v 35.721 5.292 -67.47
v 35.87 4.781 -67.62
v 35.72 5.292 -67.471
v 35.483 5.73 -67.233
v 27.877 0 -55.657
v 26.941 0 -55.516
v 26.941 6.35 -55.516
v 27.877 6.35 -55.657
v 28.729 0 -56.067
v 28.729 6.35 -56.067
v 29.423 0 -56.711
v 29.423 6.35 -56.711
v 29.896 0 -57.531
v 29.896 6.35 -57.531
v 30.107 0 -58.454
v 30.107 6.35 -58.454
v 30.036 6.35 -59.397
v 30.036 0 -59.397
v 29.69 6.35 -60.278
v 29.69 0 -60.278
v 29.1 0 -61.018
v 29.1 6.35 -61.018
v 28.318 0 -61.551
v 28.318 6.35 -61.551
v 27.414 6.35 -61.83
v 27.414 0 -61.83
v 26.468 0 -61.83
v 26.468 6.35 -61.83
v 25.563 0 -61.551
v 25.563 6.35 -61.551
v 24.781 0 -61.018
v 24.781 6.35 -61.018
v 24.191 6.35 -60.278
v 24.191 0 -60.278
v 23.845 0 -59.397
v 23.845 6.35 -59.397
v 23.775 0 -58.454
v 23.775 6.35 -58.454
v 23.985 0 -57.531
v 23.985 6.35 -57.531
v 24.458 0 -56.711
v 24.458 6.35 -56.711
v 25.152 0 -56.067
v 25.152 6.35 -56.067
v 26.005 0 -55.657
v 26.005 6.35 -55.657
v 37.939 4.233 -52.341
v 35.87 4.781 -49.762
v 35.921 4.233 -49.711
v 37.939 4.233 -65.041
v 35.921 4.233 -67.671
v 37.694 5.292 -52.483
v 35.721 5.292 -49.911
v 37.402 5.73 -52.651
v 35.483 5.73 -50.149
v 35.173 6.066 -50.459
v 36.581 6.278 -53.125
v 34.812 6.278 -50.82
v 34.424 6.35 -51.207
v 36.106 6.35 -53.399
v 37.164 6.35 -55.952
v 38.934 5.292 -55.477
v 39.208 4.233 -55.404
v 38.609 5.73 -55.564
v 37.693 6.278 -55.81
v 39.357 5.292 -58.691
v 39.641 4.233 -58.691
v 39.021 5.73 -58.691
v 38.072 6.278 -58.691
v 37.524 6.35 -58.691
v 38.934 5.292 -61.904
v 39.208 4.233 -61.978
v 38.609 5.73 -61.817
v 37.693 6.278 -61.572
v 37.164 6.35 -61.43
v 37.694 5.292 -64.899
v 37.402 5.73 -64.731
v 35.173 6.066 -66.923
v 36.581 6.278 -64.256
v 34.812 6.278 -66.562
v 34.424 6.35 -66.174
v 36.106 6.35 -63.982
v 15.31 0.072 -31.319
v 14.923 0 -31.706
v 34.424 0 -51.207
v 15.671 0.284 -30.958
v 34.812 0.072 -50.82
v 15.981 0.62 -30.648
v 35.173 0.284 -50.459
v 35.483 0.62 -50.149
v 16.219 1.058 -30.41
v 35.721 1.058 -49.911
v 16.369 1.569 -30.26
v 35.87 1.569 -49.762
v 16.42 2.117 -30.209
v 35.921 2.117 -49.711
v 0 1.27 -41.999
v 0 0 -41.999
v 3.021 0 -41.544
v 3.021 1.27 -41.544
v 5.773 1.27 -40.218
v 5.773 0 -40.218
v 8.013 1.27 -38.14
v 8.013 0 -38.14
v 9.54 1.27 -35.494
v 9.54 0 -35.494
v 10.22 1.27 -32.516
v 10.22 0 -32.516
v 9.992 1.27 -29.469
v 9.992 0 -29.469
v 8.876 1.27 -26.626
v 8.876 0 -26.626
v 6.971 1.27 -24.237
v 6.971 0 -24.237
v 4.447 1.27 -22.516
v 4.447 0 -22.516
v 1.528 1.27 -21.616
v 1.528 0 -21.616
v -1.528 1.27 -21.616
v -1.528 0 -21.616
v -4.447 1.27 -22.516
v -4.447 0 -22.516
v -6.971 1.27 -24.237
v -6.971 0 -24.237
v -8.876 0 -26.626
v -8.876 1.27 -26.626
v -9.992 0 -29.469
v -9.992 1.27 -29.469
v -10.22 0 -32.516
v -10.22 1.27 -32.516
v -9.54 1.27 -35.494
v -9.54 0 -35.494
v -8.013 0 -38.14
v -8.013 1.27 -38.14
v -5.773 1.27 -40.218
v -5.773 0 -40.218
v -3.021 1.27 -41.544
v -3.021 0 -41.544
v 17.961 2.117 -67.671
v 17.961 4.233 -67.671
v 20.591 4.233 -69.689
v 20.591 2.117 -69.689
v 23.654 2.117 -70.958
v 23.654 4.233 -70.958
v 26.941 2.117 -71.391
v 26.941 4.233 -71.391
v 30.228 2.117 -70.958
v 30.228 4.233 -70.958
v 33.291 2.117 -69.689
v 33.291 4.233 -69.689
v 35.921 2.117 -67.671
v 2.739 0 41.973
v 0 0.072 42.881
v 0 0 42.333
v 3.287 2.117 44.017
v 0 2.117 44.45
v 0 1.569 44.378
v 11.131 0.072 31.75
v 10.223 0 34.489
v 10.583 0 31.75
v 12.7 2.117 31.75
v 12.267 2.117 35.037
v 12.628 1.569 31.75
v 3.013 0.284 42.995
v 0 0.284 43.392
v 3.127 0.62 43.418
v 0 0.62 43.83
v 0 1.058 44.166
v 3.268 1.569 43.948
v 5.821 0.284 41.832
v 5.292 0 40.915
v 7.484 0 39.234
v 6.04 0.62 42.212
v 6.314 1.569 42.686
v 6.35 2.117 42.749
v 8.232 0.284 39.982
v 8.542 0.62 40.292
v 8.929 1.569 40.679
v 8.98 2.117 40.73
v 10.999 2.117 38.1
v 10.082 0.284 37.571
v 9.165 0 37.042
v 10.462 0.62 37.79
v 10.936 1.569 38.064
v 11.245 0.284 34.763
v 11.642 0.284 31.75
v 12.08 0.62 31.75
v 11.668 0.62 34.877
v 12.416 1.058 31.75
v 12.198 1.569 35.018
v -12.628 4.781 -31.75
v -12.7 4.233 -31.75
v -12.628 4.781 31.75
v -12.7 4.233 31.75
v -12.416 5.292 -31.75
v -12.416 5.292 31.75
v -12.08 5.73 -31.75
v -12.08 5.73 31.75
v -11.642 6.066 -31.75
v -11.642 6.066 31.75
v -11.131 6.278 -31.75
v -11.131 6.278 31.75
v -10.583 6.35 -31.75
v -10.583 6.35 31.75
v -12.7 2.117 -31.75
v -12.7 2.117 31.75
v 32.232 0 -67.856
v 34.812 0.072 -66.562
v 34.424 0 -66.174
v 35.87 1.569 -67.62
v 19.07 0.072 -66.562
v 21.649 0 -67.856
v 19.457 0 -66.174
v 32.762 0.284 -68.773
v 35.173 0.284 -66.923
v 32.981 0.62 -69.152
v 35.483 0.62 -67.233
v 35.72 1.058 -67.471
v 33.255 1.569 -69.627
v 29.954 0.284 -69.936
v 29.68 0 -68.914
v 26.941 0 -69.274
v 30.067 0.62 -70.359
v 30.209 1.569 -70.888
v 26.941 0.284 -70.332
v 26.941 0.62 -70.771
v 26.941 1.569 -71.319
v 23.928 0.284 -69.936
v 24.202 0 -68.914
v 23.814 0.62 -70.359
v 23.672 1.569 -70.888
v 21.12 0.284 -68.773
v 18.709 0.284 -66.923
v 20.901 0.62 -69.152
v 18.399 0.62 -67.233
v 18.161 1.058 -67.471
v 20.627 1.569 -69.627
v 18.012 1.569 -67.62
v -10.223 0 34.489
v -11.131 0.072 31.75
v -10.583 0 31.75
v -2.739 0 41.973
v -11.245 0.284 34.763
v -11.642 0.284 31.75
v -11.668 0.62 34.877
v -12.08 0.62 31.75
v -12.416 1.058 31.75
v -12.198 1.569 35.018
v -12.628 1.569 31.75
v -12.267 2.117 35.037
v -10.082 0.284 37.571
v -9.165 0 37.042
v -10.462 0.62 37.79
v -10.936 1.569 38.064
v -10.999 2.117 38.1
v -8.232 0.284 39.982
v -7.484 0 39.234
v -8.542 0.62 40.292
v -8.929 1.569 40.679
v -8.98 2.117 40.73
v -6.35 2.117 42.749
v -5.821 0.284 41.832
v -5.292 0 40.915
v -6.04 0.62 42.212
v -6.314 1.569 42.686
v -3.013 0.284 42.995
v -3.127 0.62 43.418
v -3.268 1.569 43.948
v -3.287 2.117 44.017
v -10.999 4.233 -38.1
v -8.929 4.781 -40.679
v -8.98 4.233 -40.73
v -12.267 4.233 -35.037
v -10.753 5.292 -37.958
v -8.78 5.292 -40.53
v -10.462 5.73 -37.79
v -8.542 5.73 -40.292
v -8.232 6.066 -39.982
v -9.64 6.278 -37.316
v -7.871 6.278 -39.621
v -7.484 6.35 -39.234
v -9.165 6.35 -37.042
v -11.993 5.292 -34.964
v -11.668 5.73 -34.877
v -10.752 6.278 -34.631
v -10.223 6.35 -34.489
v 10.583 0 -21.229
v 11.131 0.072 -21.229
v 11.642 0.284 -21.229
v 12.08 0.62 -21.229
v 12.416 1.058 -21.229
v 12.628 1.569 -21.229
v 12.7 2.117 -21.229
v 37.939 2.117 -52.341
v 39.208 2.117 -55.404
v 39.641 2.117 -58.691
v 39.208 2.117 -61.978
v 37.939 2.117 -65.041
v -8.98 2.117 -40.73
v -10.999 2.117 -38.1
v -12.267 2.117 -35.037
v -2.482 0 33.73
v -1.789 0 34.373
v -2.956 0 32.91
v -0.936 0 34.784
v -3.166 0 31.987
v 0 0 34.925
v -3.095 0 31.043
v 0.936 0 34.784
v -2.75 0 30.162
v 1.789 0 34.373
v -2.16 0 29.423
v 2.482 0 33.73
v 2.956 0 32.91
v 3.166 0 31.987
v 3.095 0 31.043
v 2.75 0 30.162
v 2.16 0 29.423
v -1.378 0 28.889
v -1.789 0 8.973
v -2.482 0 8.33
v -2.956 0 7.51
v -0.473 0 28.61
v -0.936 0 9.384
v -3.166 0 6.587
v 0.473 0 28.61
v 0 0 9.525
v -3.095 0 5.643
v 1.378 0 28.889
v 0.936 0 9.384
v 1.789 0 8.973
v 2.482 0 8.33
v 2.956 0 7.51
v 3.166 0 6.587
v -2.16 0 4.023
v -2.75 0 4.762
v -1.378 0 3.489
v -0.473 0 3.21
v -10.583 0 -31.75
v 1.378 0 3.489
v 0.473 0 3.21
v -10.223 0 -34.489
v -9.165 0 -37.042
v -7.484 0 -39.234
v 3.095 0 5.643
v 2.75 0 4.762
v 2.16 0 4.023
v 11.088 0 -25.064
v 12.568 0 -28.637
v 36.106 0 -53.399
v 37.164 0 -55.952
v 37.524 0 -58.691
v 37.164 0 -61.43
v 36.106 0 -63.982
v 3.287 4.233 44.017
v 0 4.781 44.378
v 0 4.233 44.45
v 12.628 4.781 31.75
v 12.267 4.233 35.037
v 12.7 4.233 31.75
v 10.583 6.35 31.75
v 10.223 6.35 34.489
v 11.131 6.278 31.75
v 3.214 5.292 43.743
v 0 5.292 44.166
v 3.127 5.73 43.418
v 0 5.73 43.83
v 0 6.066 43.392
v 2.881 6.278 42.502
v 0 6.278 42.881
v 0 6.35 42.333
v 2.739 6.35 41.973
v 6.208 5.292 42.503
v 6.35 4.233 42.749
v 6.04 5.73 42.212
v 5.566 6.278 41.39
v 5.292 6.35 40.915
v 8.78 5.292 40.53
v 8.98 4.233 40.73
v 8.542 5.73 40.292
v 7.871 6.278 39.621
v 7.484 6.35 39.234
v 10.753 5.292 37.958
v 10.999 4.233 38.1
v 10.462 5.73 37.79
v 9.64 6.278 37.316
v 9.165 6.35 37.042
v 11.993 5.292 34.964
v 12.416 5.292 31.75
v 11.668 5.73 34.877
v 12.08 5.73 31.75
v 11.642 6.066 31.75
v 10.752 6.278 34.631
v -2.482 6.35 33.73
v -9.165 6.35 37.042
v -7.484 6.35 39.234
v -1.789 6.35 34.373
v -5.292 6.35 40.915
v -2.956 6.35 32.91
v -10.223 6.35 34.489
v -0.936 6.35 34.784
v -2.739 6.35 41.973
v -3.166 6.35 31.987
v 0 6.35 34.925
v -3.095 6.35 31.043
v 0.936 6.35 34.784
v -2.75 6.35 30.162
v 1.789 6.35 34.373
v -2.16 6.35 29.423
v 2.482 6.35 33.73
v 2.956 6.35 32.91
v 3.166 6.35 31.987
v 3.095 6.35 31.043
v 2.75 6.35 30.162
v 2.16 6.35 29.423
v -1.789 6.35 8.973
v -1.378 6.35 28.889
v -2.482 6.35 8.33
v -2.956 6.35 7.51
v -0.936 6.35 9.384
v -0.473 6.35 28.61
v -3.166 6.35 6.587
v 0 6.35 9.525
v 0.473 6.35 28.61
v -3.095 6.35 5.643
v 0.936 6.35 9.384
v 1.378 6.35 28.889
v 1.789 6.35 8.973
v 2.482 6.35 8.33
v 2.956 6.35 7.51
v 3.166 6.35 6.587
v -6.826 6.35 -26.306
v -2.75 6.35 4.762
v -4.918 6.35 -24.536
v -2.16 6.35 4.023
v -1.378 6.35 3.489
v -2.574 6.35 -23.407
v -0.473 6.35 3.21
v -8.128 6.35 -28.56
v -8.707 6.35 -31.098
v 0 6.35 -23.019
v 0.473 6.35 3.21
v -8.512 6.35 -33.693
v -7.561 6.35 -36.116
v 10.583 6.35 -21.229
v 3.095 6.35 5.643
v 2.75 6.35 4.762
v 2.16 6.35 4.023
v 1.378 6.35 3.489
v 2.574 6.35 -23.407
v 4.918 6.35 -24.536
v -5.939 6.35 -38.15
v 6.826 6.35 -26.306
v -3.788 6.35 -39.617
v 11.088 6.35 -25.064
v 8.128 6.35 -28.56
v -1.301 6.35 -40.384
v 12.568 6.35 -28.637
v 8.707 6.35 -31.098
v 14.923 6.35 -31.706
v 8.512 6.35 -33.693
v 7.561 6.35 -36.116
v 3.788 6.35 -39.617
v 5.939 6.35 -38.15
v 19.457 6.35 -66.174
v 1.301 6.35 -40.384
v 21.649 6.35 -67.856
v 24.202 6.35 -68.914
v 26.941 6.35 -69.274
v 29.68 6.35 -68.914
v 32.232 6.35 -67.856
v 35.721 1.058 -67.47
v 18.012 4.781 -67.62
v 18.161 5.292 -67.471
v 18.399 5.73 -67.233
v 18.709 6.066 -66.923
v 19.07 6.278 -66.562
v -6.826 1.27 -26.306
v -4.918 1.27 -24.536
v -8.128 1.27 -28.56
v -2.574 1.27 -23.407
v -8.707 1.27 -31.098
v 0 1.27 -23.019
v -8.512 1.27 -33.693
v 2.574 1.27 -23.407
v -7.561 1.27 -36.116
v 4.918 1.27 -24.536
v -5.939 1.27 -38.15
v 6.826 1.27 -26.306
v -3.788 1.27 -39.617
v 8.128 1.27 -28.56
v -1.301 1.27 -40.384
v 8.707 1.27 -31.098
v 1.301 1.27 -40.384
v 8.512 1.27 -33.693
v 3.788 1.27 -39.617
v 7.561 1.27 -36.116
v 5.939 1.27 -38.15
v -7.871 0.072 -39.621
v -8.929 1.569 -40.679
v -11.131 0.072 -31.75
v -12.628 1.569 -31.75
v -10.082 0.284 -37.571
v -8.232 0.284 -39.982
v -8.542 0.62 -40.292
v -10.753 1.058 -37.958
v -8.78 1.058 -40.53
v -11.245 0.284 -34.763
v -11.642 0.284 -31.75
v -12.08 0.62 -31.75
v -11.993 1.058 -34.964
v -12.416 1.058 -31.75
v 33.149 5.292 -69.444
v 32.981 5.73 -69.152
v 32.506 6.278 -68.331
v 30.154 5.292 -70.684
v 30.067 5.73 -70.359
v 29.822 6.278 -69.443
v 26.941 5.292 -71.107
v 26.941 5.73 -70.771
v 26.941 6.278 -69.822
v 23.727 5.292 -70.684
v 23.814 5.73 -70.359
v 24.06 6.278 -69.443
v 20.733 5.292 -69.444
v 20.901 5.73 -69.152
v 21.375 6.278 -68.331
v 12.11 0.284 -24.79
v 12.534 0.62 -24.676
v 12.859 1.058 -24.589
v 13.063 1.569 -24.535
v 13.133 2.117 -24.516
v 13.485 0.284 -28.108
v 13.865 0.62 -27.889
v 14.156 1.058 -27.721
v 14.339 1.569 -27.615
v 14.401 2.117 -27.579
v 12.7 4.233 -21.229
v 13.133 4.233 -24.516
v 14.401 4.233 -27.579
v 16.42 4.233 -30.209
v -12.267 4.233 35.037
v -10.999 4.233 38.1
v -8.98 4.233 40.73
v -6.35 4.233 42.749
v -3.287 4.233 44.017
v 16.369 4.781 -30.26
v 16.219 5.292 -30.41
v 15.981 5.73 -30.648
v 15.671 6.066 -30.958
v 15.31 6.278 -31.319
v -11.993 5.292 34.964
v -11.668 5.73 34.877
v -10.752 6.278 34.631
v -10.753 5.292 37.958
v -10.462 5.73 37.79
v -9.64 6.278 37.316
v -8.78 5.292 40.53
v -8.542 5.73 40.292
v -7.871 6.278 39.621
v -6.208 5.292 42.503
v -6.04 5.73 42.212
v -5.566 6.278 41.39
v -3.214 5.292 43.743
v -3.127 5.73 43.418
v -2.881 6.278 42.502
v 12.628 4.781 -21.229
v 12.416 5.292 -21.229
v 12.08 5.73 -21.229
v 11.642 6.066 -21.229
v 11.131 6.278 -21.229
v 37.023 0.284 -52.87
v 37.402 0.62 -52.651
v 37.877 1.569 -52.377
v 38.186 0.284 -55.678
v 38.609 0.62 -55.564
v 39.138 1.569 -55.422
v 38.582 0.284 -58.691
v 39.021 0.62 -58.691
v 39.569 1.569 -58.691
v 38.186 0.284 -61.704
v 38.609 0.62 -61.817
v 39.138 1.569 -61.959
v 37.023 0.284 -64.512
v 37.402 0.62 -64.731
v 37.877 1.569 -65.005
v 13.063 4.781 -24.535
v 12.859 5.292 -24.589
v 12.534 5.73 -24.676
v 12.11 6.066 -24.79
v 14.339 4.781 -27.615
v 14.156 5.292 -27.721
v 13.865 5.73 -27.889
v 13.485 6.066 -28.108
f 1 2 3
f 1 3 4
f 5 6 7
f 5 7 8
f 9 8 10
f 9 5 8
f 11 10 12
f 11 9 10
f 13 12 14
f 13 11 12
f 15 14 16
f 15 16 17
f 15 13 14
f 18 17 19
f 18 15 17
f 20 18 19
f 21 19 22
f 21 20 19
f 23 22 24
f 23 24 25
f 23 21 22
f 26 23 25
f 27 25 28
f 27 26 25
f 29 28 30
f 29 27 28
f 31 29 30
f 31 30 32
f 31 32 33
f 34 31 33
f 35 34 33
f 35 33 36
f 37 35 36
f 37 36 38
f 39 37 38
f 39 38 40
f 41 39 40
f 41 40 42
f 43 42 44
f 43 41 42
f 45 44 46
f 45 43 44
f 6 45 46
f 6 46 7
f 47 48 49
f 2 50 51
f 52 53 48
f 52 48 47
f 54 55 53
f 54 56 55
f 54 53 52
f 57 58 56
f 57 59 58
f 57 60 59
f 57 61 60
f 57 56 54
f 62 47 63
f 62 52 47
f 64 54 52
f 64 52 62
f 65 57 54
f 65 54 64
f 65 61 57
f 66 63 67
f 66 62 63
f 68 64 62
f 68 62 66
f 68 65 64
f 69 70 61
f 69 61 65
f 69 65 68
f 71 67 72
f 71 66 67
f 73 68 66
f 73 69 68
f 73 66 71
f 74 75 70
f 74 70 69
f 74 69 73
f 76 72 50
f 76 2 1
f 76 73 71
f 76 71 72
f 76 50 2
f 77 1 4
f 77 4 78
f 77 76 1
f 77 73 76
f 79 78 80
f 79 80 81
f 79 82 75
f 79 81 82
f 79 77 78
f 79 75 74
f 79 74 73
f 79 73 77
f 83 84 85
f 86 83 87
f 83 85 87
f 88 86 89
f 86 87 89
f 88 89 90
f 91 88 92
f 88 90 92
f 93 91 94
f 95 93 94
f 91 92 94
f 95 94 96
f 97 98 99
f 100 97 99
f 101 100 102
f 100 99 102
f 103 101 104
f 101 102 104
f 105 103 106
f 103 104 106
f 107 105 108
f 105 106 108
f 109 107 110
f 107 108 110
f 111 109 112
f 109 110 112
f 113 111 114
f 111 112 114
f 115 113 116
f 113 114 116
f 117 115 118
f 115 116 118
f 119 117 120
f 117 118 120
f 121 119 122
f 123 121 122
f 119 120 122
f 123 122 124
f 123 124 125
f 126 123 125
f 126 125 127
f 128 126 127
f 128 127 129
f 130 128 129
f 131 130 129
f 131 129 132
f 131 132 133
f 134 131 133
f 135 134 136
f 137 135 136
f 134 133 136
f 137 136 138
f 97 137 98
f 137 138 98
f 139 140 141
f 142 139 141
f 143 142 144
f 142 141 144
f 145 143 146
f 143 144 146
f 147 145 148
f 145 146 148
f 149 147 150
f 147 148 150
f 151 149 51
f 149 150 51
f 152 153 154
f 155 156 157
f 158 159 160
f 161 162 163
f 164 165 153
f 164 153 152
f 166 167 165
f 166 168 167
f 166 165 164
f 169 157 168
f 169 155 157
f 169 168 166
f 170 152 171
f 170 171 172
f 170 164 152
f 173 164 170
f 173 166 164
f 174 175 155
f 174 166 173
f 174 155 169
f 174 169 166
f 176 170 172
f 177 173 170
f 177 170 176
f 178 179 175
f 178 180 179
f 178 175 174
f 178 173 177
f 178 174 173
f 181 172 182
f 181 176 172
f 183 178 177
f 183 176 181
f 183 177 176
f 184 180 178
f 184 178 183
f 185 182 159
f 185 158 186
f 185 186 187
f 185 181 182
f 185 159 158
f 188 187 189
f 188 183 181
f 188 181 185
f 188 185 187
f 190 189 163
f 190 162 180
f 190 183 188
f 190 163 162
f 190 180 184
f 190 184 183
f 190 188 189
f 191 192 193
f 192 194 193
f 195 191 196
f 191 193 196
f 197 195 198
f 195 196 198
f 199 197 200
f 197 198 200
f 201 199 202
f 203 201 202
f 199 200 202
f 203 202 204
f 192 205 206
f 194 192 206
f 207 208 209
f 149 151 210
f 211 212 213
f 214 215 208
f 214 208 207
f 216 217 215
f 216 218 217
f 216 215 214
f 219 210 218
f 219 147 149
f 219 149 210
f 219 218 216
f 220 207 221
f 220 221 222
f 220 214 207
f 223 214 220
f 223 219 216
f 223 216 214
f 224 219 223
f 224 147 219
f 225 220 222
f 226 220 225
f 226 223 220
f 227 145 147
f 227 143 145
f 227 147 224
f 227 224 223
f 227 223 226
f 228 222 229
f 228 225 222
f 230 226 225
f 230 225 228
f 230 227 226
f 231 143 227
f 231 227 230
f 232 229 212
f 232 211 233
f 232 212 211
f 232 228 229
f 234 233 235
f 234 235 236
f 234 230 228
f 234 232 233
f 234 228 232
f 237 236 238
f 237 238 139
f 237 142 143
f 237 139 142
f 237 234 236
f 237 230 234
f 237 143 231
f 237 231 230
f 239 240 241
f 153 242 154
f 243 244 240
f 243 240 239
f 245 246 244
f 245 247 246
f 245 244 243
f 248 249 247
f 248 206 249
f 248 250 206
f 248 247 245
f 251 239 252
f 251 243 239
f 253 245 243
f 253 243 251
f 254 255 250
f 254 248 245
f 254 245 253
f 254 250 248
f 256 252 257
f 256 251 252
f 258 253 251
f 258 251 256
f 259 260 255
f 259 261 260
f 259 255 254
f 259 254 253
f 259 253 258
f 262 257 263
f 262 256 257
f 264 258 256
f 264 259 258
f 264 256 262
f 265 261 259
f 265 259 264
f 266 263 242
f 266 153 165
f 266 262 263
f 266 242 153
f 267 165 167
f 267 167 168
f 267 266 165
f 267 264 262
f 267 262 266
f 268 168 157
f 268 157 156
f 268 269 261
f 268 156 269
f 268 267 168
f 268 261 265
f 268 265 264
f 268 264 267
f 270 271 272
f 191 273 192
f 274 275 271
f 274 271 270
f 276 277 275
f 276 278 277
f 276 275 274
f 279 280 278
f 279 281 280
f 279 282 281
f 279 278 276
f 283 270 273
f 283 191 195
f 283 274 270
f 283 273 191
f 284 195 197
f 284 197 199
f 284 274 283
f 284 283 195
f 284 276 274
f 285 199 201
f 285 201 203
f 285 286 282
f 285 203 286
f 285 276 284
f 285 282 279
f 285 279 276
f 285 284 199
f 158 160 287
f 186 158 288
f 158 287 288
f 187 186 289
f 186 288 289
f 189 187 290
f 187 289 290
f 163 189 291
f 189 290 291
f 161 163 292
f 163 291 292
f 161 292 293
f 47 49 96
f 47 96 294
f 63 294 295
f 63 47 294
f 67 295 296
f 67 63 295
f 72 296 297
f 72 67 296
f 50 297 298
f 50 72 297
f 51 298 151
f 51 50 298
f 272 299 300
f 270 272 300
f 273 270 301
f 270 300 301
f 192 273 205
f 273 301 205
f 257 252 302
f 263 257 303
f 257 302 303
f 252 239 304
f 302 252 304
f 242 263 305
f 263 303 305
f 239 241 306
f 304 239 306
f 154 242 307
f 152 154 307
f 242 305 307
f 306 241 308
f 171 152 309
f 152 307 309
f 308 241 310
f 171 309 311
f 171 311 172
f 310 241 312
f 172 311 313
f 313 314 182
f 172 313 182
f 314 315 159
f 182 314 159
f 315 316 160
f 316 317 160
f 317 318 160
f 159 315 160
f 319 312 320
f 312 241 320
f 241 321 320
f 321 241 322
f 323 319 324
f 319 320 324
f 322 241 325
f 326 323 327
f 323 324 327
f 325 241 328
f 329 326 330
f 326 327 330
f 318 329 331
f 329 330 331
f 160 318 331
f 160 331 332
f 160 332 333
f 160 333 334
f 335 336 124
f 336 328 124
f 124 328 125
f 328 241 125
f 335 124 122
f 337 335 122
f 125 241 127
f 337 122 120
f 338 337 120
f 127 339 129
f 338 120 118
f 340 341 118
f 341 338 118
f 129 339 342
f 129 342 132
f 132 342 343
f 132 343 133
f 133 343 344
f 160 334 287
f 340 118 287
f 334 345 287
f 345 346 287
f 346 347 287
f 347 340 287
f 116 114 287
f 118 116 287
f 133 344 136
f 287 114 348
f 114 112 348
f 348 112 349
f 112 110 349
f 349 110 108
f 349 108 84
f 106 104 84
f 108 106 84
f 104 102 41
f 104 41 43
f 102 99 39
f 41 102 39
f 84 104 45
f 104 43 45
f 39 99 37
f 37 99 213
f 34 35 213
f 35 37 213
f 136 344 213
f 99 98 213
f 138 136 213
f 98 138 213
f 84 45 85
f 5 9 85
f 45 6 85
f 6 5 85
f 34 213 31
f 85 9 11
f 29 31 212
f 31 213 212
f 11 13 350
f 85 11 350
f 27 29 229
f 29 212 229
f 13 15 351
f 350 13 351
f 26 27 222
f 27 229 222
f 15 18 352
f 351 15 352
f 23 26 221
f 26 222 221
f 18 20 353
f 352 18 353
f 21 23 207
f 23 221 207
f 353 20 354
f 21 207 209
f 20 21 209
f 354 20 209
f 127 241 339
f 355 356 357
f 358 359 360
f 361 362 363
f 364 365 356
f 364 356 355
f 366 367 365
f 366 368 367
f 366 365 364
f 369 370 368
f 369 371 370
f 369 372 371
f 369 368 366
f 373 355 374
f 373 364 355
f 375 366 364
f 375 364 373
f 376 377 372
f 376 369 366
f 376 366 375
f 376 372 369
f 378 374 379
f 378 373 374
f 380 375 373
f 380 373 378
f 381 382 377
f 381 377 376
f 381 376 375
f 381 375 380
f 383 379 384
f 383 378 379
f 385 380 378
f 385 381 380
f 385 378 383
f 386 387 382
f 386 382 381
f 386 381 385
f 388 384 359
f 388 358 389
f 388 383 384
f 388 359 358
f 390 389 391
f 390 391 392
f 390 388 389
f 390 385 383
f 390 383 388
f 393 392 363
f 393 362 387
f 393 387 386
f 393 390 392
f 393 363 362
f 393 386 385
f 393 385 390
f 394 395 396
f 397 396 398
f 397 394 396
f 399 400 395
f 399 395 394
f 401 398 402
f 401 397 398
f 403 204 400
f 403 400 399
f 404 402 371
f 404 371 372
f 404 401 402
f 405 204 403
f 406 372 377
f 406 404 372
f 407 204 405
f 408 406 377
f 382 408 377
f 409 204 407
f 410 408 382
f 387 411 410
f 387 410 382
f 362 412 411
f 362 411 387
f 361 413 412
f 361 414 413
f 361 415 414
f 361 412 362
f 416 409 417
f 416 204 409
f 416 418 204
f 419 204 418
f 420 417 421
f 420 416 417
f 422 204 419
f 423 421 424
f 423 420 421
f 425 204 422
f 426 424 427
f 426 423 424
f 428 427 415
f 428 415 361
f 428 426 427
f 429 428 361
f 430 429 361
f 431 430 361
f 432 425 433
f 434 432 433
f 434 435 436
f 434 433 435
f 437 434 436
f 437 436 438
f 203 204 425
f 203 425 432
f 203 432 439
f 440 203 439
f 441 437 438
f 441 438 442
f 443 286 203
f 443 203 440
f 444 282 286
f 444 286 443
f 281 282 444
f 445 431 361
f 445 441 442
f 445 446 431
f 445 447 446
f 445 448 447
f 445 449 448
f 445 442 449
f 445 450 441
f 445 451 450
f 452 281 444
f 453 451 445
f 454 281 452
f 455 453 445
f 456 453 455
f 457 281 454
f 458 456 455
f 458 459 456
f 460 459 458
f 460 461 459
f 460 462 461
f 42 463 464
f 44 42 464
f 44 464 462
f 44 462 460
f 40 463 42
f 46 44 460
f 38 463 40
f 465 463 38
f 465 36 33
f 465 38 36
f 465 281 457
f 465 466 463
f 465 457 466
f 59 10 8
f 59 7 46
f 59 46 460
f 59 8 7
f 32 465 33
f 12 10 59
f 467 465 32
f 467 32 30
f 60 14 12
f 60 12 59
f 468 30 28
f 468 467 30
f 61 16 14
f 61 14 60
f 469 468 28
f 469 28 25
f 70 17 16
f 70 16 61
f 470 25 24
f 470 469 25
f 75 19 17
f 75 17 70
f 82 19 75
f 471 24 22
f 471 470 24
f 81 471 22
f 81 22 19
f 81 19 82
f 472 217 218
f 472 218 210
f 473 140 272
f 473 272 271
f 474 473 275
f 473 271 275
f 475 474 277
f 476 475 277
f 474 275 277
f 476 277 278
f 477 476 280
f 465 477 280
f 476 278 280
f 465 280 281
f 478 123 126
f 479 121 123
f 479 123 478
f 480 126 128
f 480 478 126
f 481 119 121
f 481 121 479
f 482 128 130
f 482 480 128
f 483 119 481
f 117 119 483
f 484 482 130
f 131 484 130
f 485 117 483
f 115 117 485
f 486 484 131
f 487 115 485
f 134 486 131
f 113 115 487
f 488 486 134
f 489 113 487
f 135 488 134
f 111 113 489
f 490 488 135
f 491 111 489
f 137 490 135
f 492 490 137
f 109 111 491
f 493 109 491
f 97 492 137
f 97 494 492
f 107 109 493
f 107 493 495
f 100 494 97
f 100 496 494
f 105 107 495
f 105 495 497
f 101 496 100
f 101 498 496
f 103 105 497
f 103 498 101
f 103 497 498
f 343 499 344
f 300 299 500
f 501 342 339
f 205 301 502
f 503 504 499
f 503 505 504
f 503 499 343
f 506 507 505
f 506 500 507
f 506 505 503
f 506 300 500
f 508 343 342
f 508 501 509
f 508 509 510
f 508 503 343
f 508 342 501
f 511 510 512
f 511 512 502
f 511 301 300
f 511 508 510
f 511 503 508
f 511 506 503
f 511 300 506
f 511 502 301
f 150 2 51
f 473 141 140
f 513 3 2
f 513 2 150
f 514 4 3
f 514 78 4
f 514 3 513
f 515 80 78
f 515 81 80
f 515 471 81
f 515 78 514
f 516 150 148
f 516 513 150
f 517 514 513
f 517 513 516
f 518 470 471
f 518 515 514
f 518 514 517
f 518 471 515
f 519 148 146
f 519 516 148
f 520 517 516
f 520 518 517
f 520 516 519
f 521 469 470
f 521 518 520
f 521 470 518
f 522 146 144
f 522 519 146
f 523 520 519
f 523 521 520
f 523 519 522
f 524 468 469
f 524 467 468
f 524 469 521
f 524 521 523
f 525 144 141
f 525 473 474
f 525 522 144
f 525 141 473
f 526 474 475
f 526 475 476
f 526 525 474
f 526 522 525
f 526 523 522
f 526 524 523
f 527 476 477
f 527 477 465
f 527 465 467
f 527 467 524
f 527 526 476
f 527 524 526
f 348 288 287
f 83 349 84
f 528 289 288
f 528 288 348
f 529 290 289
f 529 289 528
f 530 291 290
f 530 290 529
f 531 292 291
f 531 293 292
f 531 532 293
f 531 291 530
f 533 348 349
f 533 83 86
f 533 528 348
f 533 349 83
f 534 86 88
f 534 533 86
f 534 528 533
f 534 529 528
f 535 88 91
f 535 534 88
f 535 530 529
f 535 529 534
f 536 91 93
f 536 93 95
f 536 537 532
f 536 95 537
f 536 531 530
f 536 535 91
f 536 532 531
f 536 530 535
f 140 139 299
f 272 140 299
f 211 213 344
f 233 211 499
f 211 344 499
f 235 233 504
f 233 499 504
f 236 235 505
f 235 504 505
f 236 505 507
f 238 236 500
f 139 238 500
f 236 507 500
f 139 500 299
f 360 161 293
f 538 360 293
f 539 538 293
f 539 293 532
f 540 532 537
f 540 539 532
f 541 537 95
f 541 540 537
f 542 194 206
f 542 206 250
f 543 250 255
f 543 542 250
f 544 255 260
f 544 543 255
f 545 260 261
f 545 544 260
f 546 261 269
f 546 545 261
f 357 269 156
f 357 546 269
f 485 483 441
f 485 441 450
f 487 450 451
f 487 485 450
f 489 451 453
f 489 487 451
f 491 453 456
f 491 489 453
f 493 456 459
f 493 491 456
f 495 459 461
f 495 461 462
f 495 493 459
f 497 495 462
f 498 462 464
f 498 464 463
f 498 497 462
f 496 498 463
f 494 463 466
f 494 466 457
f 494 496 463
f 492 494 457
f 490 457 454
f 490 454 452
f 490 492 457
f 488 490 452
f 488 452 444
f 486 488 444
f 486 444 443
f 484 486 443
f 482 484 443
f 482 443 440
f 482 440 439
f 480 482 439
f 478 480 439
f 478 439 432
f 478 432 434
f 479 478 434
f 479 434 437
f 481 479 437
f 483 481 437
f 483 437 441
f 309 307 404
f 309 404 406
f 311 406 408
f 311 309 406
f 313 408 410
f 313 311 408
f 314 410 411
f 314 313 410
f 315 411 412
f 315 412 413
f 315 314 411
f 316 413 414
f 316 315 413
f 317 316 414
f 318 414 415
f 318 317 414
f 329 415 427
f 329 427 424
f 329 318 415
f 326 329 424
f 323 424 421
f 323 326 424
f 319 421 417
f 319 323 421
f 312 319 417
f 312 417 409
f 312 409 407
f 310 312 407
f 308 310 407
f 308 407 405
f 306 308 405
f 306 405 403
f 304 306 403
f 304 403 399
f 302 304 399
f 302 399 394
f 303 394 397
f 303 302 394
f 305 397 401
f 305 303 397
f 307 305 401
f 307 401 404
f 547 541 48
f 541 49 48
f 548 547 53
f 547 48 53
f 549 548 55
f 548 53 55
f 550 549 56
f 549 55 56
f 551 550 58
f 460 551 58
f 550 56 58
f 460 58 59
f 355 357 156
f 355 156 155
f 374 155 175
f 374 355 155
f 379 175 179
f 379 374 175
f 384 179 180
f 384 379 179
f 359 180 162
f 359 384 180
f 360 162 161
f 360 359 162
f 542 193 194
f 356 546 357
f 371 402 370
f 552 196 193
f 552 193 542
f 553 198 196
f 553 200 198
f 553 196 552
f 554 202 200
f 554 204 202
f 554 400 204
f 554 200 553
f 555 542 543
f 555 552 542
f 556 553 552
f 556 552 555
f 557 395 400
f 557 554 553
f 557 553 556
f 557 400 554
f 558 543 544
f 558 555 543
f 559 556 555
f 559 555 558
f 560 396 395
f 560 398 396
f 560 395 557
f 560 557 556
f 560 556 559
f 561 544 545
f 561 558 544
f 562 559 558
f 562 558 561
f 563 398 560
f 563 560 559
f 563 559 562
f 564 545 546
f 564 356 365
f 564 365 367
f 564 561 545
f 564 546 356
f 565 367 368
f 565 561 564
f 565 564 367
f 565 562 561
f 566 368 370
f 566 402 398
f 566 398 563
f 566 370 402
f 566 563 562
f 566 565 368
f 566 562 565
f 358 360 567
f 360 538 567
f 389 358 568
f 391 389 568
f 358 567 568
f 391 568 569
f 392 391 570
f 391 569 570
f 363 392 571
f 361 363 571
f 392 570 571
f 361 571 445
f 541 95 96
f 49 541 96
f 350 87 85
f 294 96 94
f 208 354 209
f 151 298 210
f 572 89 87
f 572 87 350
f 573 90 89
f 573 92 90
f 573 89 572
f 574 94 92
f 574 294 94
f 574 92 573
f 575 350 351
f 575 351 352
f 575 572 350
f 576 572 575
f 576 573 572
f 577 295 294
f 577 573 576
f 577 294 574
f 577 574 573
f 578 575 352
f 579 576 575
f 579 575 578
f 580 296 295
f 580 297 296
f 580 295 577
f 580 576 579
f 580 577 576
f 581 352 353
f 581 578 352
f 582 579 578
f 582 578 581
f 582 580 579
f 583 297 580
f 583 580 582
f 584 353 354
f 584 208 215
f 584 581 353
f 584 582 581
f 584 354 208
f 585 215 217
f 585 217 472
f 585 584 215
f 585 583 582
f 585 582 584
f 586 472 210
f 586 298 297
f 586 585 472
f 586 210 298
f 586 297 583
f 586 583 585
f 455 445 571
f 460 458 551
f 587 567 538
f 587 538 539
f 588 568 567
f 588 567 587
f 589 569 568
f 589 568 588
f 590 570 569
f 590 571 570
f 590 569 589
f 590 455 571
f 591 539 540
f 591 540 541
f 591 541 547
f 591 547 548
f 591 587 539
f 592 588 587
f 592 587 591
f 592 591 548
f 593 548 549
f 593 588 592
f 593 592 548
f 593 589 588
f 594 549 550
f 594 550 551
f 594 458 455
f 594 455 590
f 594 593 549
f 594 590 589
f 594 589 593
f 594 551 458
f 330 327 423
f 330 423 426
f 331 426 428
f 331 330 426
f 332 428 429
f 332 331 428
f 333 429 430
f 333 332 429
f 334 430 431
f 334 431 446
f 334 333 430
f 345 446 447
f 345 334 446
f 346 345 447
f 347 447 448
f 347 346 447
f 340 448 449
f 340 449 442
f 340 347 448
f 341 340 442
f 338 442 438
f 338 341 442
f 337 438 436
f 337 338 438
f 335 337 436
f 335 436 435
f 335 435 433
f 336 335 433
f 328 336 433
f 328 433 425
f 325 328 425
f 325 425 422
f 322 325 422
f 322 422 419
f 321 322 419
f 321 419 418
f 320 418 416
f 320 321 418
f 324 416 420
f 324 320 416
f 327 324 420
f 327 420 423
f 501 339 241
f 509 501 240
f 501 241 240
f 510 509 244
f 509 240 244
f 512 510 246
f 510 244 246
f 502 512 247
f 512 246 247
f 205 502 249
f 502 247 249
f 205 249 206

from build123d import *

# Parameters (mm, degrees)
SKETCH1_R           = 3.175
SKETCH1_R_2         = 12.7
SKETCH1_R_3         = 8.73125
BOSS_EXTRUDE1_DEPTH = 6.35
FILLET2_R           = 12.7
FILLET3_R           = 2.116666667
SKETCH3_R           = 10.2489
CUT_EXTRUDE1_DEPTH  = 1.27


with BuildPart() as part:
    # Sketch1 → Boss-Extrude1 (new body)
    # profile 1 of 4: a face of its own
    with BuildSketch(Plane(origin=(0, 0, 0), x_dir=(1, 0, 0), z_dir=(0, 1, 0))):
        with BuildLine():
            Line((-12.7, 31.75), (-12.7, -44.45))
            Line((-12.7, -44.45), (12.7, -44.45))
            Line((12.7, -44.45), (12.7, 26.489487758))
            Line((12.7, 26.489487758), (8.980256121, 22.769743879))
            ThreePointArc((8.980256121, 22.769743879), (-4.860079591, 20.016729937), (-12.7, 31.75))
        make_face()
        with Locations(Location((0, -31.75, 0), (0, 0, 270))):
            Circle(SKETCH1_R, mode=Mode.SUBTRACT)
        with Locations(Location((0, -6.35, 0), (0, 0, 270))):
            Circle(SKETCH1_R, mode=Mode.SUBTRACT)
    # profile 2 of 4: a face of its own
    with BuildSketch(Plane(origin=(0, 0, 0), x_dir=(1, 0, 0), z_dir=(0, 1, 0))):
        with Locations((0, 31.75)):
            Circle(SKETCH1_R_2)
        with Locations(Location((0, 31.75, 0), (0, 0, 270))):
            Circle(SKETCH1_R_3, mode=Mode.SUBTRACT)
    # profile 3 of 4: a face of its own
    with BuildSketch(Plane(origin=(0, 0, 0), x_dir=(1, 0, 0), z_dir=(0, 1, 0))):
        with BuildLine():
            Line((12.7, 31.75), (12.7, 26.489487758))
            Line((12.7, 26.489487758), (44.901280605, 58.690768363))
            Line((44.901280605, 58.690768363), (26.940768363, 76.651280605))
            Line((26.940768363, 76.651280605), (-8.980256121, 40.730256121))
            ThreePointArc((-8.980256121, 40.730256121), (4.860079591, 43.483270063), (12.7, 31.75))
        make_face()
        with Locations(Location((26.940768363, 58.690768363, 0), (0, 0, 270))):
            Circle(SKETCH1_R, mode=Mode.SUBTRACT)
    # profile 4 of 4: a face of its own
    with BuildSketch(Plane(origin=(0, 0, 0), x_dir=(1, 0, 0), z_dir=(0, 1, 0))):
        with BuildLine():
            Line((8.980256121, 22.769743879), (12.7, 26.489487758))
            Line((12.7, 26.489487758), (12.7, 31.75))
            ThreePointArc((12.7, 31.75), (11.733270063, 26.889920409), (8.980256121, 22.769743879))
        make_face()
    extrude(amount=BOSS_EXTRUDE1_DEPTH)

    # Fillet2
    fillet2_edges = [part.edges().sort_by_distance(p)[0] for p in [
        (12.7, 3.175, -26.489487758),
        (26.940768363, 3.175, -76.651280605),
        (44.901280605, 3.175, -58.690768363),
        (-12.7, 3.175, 44.45),
        (12.7, 3.175, 44.45),
    ]]
    fillet(fillet2_edges, radius=FILLET2_R - 0.0001)  # a hair under: the kernel refuses the full size

    # Fillet3
    fillet3_edges = [part.edges().sort_by_distance(p)[0] for p in [
        (-11.733270063, 6.35, -36.610079591),
        (-11.733270063, 0, -36.610079591),
        (26.170404892, 0, -39.95989265),
        (26.170404892, 6.35, -39.95989265),
        (12.7, 0, 5.260541531),
        (12.7, 6.35, 5.260541531),
        (4.490163416, 0, -54.200675658),
        (4.490163416, 6.35, -54.200675658),
        (-12.7, 0, 5e-05),
        (8.98028541, 0, 40.73028541),
        (-8.98028541, 0, 40.73028541),
        (39.640809785, 0, -58.690768363),
        (26.940768363, 0, -71.390809785),
        (-12.7, 6.35, 5e-05),
        (8.98028541, 6.35, 40.73028541),
        (-8.98028541, 6.35, 40.73028541),
        (39.640809785, 6.35, -58.690768363),
        (26.940768363, 6.35, -71.390809785),
        (13.666722325, 0, -26.08905826),
        (13.666722325, 6.35, -26.08905826),
    ]]
    fillet(fillet3_edges, radius=FILLET3_R)

    # Sketch3 → Cut-Extrude1 (cut)
    with BuildSketch(Plane.XZ):
        with Locations(Location((0, -31.75, 0), (0, 0, 270))):
            Circle(SKETCH3_R)
    extrude(amount=-CUT_EXTRUDE1_DEPTH, mode=Mode.SUBTRACT)


solid = part.part
